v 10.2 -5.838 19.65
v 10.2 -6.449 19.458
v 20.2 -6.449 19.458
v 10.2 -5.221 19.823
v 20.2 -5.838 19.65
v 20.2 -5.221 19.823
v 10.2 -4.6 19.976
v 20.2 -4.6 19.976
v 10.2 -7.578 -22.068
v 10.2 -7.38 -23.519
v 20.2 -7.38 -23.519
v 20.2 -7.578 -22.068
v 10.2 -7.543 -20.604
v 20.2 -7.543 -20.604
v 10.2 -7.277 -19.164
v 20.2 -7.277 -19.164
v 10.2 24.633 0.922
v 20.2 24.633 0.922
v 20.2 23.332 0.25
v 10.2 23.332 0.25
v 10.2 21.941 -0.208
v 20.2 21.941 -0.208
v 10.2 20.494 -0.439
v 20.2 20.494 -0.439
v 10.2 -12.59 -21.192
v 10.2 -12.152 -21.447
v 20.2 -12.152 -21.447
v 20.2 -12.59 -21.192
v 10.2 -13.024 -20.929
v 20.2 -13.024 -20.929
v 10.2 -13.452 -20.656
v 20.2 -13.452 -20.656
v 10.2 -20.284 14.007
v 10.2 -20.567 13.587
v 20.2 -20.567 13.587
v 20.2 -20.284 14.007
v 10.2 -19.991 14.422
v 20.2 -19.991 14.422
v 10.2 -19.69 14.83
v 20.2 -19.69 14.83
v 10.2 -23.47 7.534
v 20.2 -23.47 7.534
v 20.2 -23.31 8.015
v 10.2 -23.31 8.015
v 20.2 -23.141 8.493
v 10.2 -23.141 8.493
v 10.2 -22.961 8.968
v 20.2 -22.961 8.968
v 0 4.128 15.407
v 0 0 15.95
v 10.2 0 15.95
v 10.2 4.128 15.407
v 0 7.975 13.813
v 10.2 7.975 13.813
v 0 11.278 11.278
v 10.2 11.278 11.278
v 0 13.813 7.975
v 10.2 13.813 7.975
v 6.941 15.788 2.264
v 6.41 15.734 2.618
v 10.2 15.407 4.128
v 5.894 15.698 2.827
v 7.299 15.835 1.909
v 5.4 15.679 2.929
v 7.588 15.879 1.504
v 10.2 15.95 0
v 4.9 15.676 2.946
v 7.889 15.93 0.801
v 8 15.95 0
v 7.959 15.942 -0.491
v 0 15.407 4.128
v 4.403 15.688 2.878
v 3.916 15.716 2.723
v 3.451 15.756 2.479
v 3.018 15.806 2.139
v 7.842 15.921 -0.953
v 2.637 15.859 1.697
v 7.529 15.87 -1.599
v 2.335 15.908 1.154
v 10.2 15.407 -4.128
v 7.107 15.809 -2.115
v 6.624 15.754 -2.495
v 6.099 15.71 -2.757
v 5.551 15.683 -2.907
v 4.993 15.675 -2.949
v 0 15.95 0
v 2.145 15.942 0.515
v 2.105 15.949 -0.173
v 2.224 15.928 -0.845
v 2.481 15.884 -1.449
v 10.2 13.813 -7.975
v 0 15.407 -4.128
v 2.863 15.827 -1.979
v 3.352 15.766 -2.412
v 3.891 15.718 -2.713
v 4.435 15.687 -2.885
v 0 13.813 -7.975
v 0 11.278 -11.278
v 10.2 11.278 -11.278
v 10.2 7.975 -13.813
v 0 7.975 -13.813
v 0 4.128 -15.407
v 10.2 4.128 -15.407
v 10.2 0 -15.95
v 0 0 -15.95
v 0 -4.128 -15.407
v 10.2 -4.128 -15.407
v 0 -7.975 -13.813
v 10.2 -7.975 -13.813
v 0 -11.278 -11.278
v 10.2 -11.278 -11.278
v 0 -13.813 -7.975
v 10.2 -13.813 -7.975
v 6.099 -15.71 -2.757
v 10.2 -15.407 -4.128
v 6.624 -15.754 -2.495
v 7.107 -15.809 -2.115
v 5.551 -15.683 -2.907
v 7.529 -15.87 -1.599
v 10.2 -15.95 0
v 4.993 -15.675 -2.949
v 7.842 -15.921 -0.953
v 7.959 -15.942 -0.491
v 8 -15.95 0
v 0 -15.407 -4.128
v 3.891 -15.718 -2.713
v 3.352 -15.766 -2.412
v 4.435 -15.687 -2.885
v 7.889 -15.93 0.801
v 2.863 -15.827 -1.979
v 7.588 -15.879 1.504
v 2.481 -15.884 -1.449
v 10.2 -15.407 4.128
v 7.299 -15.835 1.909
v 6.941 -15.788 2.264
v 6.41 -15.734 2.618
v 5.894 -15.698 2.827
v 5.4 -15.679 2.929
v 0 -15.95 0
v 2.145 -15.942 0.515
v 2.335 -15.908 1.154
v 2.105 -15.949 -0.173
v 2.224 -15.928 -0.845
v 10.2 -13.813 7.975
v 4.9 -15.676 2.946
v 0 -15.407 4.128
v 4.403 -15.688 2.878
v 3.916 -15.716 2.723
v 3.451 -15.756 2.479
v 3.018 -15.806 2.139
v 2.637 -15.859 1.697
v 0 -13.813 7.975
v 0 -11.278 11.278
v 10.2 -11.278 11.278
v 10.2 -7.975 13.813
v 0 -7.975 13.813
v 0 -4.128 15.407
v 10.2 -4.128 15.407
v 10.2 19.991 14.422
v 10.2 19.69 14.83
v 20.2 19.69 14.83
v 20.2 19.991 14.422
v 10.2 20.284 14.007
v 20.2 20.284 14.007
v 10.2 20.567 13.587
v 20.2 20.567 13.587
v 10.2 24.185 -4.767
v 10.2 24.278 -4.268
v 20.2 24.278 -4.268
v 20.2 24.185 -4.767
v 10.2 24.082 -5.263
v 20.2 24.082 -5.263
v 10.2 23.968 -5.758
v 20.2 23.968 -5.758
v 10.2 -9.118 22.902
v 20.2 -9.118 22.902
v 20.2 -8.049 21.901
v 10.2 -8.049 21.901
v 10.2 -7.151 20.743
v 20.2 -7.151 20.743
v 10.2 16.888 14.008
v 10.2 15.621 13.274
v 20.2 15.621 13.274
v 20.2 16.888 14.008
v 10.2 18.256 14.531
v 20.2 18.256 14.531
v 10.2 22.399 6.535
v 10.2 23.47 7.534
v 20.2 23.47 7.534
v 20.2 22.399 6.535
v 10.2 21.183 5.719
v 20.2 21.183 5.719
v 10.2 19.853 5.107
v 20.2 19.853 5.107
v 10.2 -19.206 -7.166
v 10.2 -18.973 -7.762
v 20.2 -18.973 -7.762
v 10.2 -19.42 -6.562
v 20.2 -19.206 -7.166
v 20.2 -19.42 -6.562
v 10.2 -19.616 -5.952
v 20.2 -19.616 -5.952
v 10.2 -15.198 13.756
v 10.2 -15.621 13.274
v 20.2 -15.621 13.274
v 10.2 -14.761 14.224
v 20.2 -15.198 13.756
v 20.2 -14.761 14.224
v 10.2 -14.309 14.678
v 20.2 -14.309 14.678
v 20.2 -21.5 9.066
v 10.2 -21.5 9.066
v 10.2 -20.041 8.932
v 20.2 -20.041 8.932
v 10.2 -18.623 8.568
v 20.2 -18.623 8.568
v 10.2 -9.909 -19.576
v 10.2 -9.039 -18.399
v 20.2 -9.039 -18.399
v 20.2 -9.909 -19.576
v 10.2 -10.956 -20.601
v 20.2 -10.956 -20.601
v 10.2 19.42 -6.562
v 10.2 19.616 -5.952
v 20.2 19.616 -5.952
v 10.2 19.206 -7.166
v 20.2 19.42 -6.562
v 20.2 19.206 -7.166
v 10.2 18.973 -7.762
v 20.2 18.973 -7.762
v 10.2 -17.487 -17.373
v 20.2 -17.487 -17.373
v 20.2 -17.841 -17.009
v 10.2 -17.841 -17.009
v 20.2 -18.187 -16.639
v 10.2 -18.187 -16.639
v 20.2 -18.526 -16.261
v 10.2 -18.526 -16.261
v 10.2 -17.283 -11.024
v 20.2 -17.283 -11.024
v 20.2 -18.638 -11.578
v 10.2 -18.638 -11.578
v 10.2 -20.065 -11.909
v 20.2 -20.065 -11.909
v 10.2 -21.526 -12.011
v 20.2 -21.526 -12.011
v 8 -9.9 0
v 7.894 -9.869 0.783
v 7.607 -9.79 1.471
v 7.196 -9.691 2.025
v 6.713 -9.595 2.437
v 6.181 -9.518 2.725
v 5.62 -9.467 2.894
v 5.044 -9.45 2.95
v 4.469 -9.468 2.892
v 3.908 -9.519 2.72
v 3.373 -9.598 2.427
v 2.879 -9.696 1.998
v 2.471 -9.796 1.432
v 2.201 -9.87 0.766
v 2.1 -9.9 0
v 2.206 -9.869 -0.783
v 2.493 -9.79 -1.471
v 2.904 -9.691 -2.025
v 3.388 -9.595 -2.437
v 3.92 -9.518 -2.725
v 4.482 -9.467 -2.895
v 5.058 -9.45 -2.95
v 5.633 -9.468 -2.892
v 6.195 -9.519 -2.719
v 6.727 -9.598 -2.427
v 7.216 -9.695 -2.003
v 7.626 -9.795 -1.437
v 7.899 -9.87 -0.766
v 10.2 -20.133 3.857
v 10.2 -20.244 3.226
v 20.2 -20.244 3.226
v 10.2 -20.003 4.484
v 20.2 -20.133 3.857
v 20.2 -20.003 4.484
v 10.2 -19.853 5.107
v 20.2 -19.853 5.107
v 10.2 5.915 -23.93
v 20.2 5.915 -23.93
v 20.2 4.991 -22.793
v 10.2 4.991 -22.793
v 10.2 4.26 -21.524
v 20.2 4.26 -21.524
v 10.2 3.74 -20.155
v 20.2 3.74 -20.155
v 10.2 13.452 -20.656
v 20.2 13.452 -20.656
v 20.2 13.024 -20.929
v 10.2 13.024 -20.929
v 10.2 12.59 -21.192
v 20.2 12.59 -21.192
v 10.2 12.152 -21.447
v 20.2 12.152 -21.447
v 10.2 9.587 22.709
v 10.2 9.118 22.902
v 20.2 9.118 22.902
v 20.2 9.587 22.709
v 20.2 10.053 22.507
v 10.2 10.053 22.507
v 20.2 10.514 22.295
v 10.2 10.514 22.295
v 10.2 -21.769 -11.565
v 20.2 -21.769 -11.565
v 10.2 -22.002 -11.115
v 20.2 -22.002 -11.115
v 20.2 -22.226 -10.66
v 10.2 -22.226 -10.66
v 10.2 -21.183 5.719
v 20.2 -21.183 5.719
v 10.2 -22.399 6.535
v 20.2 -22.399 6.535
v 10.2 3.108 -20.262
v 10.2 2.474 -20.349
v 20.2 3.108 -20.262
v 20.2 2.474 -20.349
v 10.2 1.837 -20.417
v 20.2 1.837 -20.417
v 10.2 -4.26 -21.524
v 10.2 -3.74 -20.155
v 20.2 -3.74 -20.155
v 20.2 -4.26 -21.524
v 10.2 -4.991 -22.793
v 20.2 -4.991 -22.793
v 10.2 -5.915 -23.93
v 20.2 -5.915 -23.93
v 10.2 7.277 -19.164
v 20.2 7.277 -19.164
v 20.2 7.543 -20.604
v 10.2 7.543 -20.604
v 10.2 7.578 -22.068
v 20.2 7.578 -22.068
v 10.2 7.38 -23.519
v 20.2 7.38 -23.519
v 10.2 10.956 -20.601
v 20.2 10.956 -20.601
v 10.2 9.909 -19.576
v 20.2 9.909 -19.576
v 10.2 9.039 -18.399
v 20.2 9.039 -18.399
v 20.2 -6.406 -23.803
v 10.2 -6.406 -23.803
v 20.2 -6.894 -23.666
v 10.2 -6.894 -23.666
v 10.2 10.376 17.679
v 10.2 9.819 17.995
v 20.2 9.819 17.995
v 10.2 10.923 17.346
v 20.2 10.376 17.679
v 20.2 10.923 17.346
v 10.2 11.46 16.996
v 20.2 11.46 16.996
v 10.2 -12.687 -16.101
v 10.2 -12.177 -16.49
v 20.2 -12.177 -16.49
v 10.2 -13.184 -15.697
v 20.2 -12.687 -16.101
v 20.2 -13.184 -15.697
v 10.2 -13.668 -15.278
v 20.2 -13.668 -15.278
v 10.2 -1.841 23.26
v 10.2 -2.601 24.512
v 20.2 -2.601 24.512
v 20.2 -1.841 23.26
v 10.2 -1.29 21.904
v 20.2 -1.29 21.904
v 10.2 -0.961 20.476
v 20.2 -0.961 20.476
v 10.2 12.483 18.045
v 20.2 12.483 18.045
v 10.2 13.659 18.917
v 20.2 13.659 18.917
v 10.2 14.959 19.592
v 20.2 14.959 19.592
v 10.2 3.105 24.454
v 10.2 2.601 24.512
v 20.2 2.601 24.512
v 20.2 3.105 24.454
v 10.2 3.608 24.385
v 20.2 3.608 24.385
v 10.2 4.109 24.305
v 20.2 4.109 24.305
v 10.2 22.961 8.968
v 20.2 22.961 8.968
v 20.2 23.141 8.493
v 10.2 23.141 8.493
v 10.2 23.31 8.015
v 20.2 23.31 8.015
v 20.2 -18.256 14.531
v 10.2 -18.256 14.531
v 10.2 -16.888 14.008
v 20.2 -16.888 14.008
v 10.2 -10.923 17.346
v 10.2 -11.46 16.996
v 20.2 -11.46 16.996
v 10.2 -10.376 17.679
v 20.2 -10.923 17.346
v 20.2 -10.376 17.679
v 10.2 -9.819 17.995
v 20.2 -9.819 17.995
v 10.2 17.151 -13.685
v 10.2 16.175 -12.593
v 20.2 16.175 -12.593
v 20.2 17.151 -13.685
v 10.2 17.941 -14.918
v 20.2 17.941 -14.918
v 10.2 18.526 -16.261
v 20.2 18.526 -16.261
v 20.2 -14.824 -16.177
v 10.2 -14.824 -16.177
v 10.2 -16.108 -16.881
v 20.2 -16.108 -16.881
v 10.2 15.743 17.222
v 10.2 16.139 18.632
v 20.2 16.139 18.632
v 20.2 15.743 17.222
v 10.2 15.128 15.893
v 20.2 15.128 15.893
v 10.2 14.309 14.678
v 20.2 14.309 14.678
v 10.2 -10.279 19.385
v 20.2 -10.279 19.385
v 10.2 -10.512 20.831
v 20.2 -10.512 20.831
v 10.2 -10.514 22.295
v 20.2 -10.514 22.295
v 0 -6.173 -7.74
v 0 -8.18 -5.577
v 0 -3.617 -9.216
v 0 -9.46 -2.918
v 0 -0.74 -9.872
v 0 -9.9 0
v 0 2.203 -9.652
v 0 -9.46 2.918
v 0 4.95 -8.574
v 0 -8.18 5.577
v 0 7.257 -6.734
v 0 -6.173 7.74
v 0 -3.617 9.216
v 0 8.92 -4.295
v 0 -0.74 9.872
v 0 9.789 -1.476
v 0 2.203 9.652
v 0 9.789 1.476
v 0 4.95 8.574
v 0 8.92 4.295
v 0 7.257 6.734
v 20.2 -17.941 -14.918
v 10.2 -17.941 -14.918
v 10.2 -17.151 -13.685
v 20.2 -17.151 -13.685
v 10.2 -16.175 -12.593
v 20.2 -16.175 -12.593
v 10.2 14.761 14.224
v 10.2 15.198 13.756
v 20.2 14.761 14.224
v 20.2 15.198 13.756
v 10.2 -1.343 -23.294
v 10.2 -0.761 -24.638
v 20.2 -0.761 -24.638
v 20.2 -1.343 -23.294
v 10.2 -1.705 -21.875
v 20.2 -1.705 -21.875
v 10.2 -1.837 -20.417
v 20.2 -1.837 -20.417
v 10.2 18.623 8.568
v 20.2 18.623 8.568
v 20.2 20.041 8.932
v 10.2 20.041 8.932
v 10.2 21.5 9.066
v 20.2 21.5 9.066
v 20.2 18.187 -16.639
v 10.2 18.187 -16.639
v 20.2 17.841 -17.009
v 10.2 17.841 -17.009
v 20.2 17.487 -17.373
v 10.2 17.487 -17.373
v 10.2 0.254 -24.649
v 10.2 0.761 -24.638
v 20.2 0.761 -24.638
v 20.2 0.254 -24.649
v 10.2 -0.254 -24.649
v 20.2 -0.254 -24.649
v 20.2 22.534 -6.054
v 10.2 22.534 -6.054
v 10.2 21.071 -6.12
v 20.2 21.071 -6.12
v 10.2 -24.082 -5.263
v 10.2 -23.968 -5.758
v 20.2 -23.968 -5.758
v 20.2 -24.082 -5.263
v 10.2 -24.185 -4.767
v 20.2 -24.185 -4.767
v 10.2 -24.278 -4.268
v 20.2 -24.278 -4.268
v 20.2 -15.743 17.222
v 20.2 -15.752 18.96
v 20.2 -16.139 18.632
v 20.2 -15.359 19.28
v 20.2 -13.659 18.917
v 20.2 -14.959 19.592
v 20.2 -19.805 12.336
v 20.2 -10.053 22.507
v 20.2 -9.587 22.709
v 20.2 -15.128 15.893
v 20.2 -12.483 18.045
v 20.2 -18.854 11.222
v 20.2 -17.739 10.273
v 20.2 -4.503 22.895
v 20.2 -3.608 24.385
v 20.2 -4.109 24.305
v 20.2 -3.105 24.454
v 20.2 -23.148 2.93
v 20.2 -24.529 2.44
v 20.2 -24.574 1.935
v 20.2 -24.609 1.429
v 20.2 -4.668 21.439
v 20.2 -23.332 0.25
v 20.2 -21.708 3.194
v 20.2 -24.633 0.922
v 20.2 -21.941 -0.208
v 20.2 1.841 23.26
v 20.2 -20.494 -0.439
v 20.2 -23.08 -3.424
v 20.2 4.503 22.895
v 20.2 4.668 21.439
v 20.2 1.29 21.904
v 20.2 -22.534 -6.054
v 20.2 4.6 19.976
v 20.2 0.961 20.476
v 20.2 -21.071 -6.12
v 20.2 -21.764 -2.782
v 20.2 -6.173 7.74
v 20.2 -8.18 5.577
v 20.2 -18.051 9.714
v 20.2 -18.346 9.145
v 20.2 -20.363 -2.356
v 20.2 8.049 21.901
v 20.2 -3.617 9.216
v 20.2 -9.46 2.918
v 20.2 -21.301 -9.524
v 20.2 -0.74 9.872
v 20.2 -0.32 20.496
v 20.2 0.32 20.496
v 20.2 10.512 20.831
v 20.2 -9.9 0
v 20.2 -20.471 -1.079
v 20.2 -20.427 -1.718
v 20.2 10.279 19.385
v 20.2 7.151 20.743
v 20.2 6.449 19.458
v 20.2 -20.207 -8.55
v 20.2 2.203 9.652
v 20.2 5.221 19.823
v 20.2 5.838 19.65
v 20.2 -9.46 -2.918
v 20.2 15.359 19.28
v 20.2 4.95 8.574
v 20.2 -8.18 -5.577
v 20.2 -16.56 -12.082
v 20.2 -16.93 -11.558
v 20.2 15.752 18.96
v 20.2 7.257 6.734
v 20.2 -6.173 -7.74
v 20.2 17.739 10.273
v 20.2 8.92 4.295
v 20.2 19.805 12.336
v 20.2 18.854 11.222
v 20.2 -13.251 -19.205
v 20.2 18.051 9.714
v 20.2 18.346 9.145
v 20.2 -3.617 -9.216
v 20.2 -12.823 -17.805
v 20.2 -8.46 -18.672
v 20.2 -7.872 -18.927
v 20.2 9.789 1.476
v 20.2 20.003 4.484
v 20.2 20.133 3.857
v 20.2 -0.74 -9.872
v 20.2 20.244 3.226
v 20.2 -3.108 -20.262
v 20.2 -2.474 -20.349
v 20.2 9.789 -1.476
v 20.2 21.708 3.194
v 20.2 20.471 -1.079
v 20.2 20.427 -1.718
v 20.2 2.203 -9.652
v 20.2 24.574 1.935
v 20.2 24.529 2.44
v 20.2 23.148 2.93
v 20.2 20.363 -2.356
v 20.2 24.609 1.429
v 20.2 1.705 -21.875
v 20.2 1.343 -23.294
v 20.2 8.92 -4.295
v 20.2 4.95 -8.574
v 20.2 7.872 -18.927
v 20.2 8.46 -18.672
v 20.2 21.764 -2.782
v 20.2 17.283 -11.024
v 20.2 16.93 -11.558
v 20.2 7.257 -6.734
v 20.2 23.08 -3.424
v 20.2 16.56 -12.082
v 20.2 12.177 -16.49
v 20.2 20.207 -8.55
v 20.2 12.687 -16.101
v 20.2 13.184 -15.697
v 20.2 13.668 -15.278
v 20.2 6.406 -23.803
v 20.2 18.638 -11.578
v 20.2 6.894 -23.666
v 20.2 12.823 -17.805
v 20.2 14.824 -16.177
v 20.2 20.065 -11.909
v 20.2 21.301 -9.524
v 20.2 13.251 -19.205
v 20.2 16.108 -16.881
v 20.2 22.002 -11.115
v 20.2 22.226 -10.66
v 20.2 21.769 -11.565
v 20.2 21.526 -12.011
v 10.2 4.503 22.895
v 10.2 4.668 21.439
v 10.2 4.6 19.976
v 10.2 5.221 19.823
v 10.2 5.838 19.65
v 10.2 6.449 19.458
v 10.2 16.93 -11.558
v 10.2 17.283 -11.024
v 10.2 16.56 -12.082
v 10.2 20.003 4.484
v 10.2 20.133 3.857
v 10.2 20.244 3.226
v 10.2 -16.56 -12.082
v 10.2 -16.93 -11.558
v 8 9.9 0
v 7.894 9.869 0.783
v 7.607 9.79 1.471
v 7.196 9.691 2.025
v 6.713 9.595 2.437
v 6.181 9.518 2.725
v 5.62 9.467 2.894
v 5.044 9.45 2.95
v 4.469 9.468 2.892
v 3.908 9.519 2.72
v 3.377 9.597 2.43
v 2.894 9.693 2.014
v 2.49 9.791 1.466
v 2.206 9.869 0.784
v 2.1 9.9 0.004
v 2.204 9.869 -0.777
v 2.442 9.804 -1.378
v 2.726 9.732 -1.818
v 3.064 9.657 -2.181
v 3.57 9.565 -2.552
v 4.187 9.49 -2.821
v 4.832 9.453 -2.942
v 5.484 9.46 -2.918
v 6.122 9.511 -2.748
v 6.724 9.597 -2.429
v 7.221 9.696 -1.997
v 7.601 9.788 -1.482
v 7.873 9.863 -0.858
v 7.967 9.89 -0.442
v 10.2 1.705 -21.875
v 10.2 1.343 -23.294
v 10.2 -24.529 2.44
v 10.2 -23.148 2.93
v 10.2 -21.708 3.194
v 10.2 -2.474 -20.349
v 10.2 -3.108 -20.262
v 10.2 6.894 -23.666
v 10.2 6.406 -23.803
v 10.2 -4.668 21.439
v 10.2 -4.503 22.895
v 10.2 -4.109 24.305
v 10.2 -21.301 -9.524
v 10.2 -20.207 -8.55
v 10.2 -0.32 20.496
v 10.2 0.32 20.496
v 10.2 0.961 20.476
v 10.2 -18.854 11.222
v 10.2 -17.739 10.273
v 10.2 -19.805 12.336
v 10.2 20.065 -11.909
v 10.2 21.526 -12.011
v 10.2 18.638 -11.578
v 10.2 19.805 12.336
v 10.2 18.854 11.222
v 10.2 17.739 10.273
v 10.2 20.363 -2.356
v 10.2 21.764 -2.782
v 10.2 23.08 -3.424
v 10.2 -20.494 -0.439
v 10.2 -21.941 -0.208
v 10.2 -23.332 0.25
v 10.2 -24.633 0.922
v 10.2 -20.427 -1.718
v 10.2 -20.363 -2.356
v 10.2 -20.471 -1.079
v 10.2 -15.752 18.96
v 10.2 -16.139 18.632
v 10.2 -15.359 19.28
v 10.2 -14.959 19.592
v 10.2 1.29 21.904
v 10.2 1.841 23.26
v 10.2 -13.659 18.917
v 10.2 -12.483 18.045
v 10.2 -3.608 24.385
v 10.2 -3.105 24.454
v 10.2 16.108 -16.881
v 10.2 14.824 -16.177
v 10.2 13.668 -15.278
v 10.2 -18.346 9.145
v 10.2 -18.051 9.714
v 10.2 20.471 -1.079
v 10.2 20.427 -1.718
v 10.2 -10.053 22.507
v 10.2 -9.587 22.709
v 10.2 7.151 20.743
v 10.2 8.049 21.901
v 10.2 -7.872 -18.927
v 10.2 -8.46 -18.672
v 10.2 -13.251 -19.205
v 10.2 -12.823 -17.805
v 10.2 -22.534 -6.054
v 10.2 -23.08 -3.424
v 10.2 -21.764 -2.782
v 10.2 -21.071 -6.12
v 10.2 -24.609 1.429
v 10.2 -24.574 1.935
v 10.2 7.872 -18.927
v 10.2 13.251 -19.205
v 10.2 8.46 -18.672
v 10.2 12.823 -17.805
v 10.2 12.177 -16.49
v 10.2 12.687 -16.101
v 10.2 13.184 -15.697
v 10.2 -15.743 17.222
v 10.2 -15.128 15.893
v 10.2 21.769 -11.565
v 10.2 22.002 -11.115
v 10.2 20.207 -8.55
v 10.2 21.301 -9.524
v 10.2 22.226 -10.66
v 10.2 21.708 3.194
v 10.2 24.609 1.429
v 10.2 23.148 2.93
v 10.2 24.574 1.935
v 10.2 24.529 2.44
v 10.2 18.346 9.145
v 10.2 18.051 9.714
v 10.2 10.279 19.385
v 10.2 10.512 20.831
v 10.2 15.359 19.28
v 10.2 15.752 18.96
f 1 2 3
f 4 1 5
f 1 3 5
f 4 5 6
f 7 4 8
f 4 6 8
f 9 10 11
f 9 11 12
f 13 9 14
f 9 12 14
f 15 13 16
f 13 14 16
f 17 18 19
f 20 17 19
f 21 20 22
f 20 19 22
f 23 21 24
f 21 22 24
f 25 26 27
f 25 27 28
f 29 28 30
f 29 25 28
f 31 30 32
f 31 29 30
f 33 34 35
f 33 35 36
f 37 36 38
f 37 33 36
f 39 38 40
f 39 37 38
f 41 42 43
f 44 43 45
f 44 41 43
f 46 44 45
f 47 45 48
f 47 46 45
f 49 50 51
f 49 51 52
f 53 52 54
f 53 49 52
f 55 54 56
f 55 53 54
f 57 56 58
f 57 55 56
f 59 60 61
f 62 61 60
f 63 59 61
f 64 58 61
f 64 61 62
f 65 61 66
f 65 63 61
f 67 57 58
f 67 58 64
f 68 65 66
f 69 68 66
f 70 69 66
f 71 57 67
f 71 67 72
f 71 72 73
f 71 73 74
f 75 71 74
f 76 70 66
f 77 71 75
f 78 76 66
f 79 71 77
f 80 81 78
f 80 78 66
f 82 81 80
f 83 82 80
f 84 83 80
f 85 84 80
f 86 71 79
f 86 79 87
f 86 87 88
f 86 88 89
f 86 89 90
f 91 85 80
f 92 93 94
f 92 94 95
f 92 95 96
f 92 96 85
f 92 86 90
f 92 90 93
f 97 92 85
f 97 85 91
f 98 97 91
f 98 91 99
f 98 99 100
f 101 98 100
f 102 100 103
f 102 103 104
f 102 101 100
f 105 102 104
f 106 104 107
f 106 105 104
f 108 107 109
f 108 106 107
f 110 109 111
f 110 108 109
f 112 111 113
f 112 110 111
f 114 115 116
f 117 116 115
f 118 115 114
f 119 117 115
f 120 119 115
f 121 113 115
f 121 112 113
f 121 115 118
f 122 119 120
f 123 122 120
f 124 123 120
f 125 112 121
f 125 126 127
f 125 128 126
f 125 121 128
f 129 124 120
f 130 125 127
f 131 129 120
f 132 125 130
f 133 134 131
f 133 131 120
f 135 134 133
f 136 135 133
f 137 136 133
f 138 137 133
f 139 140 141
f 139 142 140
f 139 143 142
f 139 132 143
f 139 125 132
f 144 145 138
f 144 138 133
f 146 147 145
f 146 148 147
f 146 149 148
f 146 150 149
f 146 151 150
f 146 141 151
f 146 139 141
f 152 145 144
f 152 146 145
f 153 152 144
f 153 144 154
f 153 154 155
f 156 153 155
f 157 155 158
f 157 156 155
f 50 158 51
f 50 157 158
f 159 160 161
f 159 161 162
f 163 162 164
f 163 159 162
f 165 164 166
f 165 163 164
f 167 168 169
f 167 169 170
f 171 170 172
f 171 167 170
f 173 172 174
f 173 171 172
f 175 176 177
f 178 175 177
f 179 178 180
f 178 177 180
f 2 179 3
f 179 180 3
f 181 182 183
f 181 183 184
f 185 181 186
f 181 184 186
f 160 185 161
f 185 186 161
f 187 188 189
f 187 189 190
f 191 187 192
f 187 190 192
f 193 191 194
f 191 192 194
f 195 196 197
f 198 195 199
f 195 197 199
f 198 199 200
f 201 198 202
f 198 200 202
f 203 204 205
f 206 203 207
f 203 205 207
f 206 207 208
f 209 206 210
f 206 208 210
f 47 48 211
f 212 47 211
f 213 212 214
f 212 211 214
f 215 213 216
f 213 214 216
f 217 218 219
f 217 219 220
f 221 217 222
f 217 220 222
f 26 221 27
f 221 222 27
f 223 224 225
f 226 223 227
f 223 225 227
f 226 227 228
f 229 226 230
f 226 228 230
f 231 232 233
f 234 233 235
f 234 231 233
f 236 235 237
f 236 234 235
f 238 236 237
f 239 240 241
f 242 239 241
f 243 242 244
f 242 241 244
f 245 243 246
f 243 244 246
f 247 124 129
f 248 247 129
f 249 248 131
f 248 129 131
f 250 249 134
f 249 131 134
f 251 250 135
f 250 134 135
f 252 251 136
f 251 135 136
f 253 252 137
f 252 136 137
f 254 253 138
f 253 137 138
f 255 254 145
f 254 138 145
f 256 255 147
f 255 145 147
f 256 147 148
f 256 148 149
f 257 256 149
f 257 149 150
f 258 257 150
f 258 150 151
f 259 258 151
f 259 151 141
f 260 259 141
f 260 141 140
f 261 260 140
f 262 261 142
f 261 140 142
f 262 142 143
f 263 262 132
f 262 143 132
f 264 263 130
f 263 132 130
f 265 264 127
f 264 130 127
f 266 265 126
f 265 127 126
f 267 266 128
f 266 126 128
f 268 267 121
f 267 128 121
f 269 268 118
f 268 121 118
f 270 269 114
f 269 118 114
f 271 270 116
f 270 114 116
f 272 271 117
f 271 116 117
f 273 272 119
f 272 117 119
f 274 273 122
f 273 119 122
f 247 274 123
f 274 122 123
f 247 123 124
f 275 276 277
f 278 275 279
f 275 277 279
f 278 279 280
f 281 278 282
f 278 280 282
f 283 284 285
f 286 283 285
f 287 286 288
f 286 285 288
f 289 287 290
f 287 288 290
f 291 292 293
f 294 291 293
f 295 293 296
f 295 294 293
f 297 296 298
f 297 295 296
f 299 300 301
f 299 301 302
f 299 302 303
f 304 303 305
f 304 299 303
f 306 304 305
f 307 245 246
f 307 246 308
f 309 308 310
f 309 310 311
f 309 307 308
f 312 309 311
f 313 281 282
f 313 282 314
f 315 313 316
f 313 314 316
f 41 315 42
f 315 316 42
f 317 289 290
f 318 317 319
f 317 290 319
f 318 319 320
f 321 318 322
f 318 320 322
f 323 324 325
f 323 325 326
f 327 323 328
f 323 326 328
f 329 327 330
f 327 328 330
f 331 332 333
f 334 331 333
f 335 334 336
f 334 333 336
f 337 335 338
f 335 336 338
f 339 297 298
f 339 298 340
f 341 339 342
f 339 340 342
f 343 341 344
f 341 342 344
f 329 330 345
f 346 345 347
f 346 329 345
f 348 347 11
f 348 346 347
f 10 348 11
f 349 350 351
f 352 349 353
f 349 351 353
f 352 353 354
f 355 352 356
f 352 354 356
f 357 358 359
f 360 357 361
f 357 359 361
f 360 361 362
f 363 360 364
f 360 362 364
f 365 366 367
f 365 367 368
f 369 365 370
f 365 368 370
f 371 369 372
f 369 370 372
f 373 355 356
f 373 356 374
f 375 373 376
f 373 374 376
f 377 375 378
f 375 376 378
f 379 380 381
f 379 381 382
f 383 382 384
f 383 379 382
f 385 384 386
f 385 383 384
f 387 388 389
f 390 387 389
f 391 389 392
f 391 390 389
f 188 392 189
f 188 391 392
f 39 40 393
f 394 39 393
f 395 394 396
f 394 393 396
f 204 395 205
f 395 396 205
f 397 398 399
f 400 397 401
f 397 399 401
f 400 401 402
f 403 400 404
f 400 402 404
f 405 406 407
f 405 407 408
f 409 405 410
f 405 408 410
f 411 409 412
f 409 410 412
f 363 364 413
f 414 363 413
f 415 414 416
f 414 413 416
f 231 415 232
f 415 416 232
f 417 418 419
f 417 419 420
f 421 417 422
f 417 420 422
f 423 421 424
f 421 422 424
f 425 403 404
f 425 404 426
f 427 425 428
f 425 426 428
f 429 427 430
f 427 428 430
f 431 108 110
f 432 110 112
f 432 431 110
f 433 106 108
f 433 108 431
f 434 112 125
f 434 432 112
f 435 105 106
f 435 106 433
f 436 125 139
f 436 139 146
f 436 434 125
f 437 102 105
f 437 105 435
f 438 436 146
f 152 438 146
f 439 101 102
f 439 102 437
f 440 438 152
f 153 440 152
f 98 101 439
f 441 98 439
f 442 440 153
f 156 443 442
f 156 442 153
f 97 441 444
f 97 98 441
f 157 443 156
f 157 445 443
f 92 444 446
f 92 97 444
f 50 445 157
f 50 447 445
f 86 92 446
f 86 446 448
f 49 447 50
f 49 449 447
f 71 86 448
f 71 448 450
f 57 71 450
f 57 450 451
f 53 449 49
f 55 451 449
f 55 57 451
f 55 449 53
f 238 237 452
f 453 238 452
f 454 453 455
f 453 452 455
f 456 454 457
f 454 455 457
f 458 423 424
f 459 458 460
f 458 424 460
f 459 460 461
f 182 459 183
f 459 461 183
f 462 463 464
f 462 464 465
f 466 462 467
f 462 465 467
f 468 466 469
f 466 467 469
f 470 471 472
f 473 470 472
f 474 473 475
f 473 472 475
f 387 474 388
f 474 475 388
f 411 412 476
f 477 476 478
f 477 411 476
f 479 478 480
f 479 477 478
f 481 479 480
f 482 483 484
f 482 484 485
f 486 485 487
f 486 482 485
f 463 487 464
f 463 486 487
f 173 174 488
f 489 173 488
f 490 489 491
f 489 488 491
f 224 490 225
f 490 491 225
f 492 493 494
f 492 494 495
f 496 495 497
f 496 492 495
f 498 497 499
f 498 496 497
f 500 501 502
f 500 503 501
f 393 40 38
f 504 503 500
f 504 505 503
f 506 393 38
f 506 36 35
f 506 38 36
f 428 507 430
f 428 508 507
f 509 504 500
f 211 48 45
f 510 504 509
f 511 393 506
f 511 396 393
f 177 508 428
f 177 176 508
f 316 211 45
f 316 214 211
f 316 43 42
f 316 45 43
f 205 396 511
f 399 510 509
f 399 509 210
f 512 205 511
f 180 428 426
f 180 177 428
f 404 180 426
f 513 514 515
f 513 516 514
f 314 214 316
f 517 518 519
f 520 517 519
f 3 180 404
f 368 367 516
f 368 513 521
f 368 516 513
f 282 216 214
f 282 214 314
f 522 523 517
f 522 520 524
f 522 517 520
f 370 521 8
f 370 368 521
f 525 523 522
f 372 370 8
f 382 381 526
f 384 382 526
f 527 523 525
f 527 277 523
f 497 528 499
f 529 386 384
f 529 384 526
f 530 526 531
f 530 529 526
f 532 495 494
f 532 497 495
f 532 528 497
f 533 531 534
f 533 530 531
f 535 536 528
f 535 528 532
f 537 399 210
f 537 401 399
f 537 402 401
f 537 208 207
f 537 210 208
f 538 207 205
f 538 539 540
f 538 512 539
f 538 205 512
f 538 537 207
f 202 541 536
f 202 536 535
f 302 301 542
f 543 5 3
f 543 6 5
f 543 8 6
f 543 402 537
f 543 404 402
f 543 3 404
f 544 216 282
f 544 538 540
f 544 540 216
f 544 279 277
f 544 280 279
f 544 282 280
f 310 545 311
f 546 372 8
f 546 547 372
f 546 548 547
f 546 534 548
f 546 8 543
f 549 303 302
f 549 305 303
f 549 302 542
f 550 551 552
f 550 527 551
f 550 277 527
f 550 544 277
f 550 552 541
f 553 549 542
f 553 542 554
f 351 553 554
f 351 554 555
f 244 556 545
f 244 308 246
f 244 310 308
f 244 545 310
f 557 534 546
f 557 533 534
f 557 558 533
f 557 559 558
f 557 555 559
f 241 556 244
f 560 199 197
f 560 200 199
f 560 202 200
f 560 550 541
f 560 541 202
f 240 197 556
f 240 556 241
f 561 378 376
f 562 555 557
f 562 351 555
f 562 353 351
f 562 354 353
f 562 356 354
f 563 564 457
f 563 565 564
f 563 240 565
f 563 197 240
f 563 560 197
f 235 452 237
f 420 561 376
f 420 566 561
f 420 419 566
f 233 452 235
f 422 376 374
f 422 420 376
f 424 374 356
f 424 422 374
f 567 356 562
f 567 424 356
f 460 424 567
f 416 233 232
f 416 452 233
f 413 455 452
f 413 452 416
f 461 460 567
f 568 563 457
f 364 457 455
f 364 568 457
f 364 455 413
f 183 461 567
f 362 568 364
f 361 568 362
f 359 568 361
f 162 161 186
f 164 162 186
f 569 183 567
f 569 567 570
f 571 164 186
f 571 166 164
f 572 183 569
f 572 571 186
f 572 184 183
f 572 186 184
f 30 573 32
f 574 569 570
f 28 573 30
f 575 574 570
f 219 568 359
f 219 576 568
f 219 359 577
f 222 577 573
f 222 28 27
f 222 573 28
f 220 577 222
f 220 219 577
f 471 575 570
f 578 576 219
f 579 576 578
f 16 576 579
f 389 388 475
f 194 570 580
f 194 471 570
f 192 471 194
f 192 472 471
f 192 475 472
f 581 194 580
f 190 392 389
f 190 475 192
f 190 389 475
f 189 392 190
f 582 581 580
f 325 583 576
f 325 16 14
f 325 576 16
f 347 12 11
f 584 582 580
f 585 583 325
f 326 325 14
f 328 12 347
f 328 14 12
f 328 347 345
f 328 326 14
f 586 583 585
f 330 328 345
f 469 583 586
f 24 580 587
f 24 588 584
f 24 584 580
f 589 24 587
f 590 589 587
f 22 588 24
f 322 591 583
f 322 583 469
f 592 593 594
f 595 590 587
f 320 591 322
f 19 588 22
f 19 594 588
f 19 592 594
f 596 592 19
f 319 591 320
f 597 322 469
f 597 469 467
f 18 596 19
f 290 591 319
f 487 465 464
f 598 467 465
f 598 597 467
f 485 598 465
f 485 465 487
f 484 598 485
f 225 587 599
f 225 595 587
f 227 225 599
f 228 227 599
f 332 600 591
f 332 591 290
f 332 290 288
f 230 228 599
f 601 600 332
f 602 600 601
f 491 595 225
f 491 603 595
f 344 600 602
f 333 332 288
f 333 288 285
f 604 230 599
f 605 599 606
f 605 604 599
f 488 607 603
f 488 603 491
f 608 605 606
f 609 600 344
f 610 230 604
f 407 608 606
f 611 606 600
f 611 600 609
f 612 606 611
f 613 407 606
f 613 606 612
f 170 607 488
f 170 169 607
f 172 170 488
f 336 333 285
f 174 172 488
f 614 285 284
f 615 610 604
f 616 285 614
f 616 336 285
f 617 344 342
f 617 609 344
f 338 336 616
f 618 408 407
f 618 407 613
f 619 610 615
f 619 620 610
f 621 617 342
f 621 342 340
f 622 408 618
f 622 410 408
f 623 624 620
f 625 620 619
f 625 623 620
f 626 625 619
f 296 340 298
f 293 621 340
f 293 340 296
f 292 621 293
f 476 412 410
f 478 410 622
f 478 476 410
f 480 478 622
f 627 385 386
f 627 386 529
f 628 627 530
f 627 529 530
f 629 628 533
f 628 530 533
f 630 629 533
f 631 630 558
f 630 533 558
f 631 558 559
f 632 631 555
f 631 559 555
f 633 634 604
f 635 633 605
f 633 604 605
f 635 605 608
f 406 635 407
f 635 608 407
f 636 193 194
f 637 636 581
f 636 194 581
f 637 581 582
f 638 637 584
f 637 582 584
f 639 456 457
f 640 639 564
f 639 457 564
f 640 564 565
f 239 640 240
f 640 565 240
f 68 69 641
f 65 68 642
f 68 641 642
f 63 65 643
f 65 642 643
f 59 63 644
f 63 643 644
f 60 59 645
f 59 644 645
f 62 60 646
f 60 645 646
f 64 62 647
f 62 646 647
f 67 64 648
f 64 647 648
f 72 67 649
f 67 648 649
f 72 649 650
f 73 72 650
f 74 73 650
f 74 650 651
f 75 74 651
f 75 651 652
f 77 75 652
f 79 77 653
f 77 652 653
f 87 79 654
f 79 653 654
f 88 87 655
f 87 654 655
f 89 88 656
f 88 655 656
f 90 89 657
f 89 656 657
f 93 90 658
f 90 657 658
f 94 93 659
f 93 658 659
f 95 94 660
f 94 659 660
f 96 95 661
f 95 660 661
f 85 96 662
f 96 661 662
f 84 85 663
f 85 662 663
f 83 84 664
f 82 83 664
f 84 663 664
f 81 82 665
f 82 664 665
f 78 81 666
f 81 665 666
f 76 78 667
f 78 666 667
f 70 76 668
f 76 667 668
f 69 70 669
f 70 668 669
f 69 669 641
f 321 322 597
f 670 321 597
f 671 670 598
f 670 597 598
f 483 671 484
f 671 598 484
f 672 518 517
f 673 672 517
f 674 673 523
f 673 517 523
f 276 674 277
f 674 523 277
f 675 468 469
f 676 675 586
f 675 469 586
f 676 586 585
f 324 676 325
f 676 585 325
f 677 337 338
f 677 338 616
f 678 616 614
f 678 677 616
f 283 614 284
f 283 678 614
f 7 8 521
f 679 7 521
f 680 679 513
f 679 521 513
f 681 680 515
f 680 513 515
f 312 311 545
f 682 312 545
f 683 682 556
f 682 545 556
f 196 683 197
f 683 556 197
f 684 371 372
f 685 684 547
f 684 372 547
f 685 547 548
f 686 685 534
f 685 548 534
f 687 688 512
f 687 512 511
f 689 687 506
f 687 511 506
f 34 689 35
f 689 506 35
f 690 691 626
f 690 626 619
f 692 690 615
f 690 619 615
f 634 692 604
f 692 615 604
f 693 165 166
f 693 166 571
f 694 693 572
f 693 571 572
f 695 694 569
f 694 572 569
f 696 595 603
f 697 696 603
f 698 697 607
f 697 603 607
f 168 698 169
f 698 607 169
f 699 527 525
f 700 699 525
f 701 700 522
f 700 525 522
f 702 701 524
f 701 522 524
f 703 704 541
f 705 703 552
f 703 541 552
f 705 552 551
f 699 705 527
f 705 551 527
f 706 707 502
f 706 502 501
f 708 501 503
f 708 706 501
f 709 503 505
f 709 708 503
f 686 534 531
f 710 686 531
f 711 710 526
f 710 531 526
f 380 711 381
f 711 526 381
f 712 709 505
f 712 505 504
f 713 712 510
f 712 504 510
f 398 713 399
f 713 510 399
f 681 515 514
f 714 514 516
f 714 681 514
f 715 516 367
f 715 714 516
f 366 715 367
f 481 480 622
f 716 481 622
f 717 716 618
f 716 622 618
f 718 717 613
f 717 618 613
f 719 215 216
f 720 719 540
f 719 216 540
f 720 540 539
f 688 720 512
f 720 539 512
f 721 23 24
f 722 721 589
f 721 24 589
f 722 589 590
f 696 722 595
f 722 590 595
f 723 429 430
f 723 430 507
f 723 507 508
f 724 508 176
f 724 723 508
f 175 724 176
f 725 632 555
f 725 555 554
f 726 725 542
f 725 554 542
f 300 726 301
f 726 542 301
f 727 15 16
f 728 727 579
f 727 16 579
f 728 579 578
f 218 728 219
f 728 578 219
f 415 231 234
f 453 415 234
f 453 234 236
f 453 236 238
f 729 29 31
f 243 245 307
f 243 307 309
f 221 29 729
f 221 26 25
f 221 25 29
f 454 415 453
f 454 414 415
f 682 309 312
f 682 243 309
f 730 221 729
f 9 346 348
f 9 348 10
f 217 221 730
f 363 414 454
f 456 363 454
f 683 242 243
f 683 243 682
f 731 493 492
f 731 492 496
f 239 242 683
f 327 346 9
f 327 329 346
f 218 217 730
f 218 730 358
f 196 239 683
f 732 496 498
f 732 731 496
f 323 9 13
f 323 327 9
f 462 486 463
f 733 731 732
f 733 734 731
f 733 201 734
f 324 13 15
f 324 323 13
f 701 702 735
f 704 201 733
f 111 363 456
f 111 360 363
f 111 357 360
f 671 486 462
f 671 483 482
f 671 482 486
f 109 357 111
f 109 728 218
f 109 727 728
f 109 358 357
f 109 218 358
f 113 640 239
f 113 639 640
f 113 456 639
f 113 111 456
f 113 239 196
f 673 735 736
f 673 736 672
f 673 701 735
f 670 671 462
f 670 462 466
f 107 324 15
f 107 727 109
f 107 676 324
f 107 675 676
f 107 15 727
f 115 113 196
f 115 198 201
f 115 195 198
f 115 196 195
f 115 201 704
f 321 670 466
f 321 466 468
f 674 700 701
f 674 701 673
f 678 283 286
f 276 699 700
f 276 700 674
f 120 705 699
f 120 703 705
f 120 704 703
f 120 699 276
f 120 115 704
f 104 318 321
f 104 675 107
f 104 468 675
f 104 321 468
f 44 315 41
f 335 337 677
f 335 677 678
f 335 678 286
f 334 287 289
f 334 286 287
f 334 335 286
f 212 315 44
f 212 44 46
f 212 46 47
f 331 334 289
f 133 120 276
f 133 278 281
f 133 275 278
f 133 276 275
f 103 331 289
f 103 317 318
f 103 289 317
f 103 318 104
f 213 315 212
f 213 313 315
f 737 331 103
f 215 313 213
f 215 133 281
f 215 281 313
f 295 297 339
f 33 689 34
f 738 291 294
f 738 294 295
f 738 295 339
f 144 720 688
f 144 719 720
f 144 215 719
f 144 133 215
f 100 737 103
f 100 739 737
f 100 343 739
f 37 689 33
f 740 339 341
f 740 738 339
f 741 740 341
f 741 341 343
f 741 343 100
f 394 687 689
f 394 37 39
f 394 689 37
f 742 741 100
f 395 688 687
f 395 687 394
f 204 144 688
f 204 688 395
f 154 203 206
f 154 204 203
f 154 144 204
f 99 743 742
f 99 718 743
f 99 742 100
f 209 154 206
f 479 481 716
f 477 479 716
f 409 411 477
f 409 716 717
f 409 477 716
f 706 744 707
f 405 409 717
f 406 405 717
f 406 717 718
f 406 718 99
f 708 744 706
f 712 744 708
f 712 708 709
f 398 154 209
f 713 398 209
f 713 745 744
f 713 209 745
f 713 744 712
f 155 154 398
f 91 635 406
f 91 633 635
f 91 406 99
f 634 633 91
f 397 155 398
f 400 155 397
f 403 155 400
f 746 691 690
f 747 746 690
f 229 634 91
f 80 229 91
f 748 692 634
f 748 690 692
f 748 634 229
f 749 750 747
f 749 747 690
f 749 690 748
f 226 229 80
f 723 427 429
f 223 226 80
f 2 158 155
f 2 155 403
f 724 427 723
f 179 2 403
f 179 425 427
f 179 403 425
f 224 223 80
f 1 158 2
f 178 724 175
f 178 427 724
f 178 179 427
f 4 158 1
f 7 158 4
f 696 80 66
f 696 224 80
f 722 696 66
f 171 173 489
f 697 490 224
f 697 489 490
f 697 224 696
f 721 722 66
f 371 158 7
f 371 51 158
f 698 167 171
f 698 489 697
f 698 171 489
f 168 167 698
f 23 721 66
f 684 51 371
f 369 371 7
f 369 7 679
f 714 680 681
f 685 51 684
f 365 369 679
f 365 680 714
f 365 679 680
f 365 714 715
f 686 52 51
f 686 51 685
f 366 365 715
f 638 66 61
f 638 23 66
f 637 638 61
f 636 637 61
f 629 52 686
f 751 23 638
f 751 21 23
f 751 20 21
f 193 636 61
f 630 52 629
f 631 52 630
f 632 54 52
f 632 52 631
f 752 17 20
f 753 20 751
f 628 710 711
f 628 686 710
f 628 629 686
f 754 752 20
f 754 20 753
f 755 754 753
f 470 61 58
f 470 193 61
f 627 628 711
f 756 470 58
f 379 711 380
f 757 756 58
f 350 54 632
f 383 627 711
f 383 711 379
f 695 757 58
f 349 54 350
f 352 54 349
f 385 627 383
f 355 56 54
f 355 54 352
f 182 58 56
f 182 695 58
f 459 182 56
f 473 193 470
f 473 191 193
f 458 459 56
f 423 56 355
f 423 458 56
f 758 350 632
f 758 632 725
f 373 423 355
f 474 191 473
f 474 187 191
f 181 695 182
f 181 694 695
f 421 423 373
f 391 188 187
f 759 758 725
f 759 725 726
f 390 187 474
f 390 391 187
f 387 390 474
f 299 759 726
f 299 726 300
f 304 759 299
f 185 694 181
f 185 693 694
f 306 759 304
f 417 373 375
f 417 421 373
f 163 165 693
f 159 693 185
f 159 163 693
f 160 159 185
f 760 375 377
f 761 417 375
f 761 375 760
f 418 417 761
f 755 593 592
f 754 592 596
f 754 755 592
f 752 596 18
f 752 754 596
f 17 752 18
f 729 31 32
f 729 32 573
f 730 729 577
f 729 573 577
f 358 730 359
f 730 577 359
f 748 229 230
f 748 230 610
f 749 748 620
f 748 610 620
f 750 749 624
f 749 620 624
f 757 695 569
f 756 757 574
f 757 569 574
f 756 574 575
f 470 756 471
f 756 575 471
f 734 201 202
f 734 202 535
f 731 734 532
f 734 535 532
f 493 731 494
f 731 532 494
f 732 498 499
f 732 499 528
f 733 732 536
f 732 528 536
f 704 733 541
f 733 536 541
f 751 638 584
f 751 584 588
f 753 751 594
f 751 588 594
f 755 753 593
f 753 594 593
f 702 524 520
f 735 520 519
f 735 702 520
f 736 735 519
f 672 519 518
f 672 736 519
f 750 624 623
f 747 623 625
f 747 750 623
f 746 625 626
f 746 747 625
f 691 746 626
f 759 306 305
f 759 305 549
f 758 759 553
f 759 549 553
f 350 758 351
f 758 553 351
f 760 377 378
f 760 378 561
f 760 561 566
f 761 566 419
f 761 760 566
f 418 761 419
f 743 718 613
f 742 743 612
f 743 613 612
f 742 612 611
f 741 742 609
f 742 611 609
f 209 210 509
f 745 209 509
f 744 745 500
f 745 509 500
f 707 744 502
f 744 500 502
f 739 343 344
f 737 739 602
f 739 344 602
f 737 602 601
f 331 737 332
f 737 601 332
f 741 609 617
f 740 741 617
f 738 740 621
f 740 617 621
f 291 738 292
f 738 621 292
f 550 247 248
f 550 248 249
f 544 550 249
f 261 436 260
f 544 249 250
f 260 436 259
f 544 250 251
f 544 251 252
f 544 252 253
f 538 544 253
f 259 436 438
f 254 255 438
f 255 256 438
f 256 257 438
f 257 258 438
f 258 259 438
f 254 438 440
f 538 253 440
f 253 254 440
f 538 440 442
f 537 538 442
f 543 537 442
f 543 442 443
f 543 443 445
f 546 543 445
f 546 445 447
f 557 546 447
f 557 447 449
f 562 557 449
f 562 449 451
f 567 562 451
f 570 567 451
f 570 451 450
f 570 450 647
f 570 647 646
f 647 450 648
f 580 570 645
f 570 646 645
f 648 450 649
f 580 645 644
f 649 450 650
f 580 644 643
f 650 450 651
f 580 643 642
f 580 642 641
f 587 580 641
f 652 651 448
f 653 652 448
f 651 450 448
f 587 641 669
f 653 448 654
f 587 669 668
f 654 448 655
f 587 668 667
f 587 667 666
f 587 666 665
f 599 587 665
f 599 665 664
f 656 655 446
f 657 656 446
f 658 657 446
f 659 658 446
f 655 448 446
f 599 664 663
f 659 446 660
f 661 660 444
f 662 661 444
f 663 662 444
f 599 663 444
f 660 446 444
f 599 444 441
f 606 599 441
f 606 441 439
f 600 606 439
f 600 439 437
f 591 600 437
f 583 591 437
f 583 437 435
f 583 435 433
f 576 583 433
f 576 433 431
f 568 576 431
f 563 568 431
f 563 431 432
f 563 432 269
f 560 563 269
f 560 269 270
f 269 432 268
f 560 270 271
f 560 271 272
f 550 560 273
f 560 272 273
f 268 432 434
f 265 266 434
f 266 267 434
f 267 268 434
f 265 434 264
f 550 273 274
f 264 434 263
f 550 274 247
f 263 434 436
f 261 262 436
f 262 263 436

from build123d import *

# Parameters (mm, degrees)
F2_R            = 9.9
F3_DEPTH        = 25
F5_DEPTH        = 25
F5_COPIES_COUNT = 23
F7_R            = 2.95
F8_DEPTH        = 24.9


# Not quite as in the source:
# - a feature of the source that left no trace in its solid (it failed there, or was rolled back) is left out
# - a pattern or mirror of a feature is missing from the dataset's text; its kind, count and spacing are read off the source's solid


with BuildPart() as f1:
    # F0 (on Front) → F1 (revolve)
    with BuildSketch(Plane.XZ):
        Polygon((0, 15.95), (0, 0), (20.2, 0), (20.2, 24.65), (10.2, 24.65), (10.2, 15.95), align=None)
    revolve(axis=Axis((10.1, 0, 0), (-1, 0, 0)))

    # F2 (on face) → F3 (cut)
    with BuildSketch(Plane(origin=(0, 0, 0), x_dir=(0, -1, 0), z_dir=(-1, 0, 0))):
        Circle(F2_R)
    extrude(amount=-F3_DEPTH, mode=Mode.SUBTRACT)

    # F4 (on face) → F5 (cut)
    with BuildSketch(Plane.YZ.offset(20.2)):
        with BuildLine():
            ThreePointArc((0.9605272399, 20.4764837905), (1.5385061373, 22.5929437067), (2.6011700561, 24.5123726787))
            ThreePointArc((2.6011700561, 24.5123726787), (0, 24.65), (-2.6011700561, 24.5123726787))
            ThreePointArc((-2.6011700561, 24.5123726787), (-1.5385061373, 22.5929437067), (-0.9605272399, 20.4764837905))
            ThreePointArc((-0.9605272399, 20.4764837905), (0, 20.499), (0.9605272399, 20.4764837905))
        make_face()
        with BuildLine():
            ThreePointArc((2.6011700561, 24.5123726787), (2.7312798677, 24.6882080288), (2.8655332609, 24.8609004137))
            ThreePointArc((2.8655332609, 24.8609004137), (0, 25.0255), (-2.8655332609, 24.8609004137))
            ThreePointArc((-2.8655332609, 24.8609004137), (-2.7312798677, 24.6882080288), (-2.6011700561, 24.5123726787))
            ThreePointArc((-2.6011700561, 24.5123726787), (0, 24.65), (2.6011700561, 24.5123726787))
        make_face()
    f5 = extrude(amount=-F5_DEPTH, mode=Mode.SUBTRACT)

    # F5_copies: F5 ×23 about axis
    f5_copies_axis = Axis((0, 0, 0), (1, 0, 0))
    for i in range(1, F5_COPIES_COUNT):
        add(f5.rotate(f5_copies_axis, i * 360 / F5_COPIES_COUNT), mode=Mode.SUBTRACT)

    # F7 (on Front) → F8 (cut, symmetric)
    with BuildSketch(Plane.XZ):
        with Locations((5.05, 0)):
            Circle(F7_R)
    extrude(amount=F8_DEPTH, both=True, mode=Mode.SUBTRACT)


solid = f1.part
